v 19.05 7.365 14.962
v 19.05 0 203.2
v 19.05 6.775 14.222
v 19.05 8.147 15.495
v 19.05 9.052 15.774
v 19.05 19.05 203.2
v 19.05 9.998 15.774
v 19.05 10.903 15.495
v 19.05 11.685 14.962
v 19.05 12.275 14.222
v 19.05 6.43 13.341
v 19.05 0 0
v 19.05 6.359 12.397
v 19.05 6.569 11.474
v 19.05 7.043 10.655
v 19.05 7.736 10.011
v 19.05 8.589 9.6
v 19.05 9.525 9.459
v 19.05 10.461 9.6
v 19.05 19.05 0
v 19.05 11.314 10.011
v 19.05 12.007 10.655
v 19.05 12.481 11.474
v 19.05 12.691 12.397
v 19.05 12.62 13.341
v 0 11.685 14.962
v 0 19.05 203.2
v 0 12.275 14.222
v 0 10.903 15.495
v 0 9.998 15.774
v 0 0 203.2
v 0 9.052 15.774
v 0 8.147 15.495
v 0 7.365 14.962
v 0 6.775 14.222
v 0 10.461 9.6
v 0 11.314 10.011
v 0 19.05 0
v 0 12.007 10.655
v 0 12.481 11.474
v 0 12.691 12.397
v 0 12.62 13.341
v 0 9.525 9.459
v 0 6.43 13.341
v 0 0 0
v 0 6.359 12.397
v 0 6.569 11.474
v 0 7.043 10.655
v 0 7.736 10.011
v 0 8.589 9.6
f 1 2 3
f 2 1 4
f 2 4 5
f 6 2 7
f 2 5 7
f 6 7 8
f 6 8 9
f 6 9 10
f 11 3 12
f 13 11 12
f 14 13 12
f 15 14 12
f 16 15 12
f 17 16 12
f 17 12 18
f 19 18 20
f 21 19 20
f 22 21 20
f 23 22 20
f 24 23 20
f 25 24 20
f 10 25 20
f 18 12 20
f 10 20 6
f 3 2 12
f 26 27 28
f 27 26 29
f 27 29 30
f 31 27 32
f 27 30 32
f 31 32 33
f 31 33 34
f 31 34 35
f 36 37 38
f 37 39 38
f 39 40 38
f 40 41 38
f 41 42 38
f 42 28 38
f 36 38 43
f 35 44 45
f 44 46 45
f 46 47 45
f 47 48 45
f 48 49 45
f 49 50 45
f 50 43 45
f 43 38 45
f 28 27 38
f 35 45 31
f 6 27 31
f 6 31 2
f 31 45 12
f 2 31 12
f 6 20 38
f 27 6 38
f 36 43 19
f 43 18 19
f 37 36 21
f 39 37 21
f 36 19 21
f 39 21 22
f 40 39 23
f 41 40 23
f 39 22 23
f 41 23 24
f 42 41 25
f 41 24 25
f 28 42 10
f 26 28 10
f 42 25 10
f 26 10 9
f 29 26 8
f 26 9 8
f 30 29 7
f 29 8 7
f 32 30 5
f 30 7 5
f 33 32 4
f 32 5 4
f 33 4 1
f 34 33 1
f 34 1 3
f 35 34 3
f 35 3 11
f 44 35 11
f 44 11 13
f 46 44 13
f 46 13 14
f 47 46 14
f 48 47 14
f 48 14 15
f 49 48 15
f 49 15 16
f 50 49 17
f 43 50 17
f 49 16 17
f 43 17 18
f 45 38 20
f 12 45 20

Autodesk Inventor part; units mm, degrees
ref_plane "YZ Plane" through (0, 0, 0) normal (1, 0, 0) x (0, 1, 0)
ref_plane "XZ Plane" through (0, 0, 0) normal (0, 1, 0) x (-1, 0, 0)
ref_plane "XY Plane" through (0, 0, 0) normal (0, 0, 1) x (1, 0, 0)
sketch "Sketch1" plane through (0, 0, 0) normal (0, 0, 1) x (1, 0, 0)
  line L0 (0, 0) -> (19.05, 0)
  line L1 (19.05, 0) -> (19.05, 19.05)
  line L2 (19.05, 19.05) -> (0, 19.05)
  line L3 (0, 19.05) -> (0, 0)
  dimension "d0" = 19.05
  dimension "d1" = 19.05
extrude "Extrusion1" add sketch "Sketch1" along normal blind 203.2
sketch "Sketch2" plane through (19.05, 0, 0) normal (1, 0, 0) x (0, 0, -1)
  line L0 (0, 0) -> (0, 19.05) projected
  line L1 (0, 19.05) -> (-203.2, 19.05) projected
  line L2 (-203.2, 0) -> (-203.2, 19.05) projected
  line L3 (0, 0) -> (-203.2, 0) projected
  line L4 (0, 9.525) -> (-203.2, 9.525) construction
  line L5 (-203.2, 0) -> (-203.2, 19.05) construction
  circle A0 centre (-12.6343, 9.525) radius 3.175
  dimension "d4" = 6.35
extrude "Extrusion2" cut sketch "Sketch2" against normal through all contours A0
properties part number "sidepeices"
